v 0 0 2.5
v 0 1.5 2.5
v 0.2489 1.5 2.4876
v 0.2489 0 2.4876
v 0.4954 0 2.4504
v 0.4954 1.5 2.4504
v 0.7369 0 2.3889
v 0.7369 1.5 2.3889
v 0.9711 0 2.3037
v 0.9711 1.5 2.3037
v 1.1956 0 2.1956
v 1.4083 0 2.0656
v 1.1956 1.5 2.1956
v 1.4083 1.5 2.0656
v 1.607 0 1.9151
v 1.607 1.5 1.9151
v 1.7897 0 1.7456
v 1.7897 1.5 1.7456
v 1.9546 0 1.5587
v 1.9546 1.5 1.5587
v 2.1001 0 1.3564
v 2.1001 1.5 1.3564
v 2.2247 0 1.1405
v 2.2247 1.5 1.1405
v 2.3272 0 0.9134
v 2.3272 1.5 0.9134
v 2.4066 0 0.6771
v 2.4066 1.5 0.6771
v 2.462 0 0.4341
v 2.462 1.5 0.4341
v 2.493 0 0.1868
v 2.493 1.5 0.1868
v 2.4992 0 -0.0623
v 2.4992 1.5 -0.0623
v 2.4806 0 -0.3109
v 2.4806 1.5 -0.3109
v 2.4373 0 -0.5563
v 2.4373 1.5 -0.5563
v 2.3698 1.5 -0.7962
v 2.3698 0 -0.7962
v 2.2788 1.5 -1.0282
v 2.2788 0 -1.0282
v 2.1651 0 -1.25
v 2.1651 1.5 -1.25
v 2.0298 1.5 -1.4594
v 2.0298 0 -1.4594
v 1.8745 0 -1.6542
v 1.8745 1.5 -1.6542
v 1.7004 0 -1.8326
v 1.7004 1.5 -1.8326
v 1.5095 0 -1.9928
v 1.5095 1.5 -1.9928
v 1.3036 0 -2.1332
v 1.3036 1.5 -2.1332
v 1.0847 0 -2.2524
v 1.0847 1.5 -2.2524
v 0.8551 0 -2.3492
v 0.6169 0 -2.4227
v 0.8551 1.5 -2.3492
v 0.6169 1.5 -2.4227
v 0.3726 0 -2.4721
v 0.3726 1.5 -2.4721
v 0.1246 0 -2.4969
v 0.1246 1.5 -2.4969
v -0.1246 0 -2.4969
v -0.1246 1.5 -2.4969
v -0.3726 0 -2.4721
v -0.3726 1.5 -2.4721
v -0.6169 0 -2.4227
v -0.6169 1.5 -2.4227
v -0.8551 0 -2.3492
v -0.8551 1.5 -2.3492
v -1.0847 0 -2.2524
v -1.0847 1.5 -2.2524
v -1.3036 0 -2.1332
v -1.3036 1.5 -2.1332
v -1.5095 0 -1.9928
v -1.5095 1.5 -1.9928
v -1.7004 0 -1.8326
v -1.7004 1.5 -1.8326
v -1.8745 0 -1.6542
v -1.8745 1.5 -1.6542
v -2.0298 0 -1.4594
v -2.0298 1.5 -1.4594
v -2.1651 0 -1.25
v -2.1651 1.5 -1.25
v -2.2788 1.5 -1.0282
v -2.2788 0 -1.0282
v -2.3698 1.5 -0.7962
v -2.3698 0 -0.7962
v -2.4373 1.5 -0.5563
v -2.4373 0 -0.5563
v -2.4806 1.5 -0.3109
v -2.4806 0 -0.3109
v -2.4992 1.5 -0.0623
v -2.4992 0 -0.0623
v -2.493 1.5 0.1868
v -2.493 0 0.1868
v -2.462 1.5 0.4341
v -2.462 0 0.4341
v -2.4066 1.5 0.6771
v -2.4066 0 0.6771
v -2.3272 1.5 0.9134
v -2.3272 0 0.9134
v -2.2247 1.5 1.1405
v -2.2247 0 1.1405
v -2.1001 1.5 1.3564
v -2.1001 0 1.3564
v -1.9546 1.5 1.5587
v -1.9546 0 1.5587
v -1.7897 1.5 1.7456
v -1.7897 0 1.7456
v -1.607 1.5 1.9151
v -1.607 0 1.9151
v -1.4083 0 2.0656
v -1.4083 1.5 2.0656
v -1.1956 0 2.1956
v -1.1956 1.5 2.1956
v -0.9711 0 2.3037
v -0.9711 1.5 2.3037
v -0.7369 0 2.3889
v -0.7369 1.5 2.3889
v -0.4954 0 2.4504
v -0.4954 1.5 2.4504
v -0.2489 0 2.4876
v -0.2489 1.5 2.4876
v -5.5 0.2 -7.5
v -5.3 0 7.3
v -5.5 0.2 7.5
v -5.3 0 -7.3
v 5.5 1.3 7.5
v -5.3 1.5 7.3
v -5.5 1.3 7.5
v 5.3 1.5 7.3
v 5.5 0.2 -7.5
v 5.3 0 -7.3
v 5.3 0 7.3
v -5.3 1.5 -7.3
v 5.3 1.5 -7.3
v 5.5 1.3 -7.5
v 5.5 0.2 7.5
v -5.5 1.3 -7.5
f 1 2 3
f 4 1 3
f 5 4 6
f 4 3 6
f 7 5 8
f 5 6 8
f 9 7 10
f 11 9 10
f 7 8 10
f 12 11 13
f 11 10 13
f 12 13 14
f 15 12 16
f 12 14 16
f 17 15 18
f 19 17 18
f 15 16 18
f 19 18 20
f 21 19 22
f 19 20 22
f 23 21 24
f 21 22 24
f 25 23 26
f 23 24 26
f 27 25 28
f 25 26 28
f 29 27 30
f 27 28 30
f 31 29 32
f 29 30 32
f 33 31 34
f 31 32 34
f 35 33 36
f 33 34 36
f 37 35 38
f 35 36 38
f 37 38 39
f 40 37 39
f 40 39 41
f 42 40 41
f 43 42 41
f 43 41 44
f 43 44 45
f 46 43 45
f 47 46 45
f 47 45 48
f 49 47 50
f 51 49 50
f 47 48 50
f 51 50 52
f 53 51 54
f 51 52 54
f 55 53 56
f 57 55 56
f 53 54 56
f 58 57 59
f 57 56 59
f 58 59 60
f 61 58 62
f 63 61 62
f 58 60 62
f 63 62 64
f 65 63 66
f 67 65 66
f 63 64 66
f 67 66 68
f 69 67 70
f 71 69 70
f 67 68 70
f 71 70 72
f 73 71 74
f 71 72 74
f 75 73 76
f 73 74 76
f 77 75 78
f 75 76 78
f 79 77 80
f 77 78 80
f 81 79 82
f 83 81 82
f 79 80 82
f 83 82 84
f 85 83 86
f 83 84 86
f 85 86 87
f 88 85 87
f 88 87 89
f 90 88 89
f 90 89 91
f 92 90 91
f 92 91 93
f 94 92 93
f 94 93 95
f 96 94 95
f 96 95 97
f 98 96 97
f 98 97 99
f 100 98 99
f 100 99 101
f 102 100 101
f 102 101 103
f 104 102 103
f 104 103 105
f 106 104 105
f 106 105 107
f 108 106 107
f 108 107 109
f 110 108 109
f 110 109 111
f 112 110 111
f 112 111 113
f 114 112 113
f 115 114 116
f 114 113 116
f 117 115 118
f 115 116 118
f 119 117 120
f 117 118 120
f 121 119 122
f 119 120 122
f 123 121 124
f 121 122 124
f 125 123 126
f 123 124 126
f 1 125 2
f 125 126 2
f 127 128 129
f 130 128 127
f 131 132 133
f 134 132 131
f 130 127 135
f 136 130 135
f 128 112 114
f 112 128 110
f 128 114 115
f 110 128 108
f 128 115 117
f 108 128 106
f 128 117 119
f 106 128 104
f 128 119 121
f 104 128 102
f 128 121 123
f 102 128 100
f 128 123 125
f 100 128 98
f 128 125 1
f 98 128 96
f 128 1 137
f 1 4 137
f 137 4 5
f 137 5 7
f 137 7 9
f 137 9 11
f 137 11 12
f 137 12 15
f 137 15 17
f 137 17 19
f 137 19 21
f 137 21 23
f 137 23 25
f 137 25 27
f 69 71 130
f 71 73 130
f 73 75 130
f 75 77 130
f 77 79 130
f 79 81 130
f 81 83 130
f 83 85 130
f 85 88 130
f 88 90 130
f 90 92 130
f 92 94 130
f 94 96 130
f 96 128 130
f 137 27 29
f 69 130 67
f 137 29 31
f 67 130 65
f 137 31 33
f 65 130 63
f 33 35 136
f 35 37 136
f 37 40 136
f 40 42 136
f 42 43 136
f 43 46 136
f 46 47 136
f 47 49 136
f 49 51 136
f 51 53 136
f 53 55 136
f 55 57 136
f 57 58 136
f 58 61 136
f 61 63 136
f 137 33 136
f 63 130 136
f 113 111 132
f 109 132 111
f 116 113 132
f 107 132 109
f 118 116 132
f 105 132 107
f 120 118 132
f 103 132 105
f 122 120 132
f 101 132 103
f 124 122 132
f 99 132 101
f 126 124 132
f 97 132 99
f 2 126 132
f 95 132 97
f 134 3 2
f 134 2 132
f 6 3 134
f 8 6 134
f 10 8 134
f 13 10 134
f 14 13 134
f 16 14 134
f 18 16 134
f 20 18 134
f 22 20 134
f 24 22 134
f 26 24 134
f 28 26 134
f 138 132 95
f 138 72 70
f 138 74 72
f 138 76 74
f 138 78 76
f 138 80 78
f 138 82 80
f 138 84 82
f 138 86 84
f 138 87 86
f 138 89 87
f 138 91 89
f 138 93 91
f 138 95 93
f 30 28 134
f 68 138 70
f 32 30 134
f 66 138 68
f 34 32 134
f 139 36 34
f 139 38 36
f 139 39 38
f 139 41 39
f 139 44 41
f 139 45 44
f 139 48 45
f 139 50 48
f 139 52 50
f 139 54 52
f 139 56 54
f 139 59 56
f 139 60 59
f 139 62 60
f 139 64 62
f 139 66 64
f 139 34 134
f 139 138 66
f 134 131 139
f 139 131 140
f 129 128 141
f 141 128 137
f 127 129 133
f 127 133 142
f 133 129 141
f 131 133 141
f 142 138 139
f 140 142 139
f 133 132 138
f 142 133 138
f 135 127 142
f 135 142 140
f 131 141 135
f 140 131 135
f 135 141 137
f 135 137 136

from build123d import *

# Parameters (mm, degrees)
SKETCH_1_W          = 11
SKETCH_1_H          = 15
EXTRUDE_1_DEPTH     = 1.5
SKETCH_2_R          = 2.5
CUT_EXTRUDE_1_DEPTH = 1.5
CHAMFER_1_SIZE      = 0.2
CHAMFER_2_SIZE      = 0.2


with BuildPart() as part:
    # ｽｹｯﾁ1 → ﾎﾞｽ - 押し出し1 (new body)
    with BuildSketch(Plane(origin=(0, 0, 0), x_dir=(1, 0, 0), z_dir=(0, 1, 0))):
        Rectangle(SKETCH_1_W, SKETCH_1_H)
    extrude(amount=EXTRUDE_1_DEPTH)

    # ｽｹｯﾁ2 → ｶｯﾄ - 押し出し1 (cut)
    with BuildSketch(Plane(origin=(0, 1.5, 0), x_dir=(1, 0, 0), z_dir=(0, 1, 0))):
        with Locations(Location((0, 0, 0), (0, 0, 270))):
            Circle(SKETCH_2_R)
    extrude(amount=-CUT_EXTRUDE_1_DEPTH, mode=Mode.SUBTRACT)

    # 面取り1
    chamfer_1_edges = [part.edges().sort_by_distance(p)[0] for p in [
        (-5.5, 1.5, 0),
        (0, 1.5, 7.5),
        (5.5, 1.5, 0),
        (0, 1.5, -7.5),
    ]]
    chamfer(chamfer_1_edges, length=CHAMFER_1_SIZE)

    # 面取り2
    chamfer_2_edges = [part.edges().sort_by_distance(p)[0] for p in [
        (0, 0, 7.5),
        (-5.5, 0, 0),
        (0, 0, -7.5),
        (5.5, 0, 0),
    ]]
    chamfer(chamfer_2_edges, length=CHAMFER_2_SIZE)


solid = part.part
